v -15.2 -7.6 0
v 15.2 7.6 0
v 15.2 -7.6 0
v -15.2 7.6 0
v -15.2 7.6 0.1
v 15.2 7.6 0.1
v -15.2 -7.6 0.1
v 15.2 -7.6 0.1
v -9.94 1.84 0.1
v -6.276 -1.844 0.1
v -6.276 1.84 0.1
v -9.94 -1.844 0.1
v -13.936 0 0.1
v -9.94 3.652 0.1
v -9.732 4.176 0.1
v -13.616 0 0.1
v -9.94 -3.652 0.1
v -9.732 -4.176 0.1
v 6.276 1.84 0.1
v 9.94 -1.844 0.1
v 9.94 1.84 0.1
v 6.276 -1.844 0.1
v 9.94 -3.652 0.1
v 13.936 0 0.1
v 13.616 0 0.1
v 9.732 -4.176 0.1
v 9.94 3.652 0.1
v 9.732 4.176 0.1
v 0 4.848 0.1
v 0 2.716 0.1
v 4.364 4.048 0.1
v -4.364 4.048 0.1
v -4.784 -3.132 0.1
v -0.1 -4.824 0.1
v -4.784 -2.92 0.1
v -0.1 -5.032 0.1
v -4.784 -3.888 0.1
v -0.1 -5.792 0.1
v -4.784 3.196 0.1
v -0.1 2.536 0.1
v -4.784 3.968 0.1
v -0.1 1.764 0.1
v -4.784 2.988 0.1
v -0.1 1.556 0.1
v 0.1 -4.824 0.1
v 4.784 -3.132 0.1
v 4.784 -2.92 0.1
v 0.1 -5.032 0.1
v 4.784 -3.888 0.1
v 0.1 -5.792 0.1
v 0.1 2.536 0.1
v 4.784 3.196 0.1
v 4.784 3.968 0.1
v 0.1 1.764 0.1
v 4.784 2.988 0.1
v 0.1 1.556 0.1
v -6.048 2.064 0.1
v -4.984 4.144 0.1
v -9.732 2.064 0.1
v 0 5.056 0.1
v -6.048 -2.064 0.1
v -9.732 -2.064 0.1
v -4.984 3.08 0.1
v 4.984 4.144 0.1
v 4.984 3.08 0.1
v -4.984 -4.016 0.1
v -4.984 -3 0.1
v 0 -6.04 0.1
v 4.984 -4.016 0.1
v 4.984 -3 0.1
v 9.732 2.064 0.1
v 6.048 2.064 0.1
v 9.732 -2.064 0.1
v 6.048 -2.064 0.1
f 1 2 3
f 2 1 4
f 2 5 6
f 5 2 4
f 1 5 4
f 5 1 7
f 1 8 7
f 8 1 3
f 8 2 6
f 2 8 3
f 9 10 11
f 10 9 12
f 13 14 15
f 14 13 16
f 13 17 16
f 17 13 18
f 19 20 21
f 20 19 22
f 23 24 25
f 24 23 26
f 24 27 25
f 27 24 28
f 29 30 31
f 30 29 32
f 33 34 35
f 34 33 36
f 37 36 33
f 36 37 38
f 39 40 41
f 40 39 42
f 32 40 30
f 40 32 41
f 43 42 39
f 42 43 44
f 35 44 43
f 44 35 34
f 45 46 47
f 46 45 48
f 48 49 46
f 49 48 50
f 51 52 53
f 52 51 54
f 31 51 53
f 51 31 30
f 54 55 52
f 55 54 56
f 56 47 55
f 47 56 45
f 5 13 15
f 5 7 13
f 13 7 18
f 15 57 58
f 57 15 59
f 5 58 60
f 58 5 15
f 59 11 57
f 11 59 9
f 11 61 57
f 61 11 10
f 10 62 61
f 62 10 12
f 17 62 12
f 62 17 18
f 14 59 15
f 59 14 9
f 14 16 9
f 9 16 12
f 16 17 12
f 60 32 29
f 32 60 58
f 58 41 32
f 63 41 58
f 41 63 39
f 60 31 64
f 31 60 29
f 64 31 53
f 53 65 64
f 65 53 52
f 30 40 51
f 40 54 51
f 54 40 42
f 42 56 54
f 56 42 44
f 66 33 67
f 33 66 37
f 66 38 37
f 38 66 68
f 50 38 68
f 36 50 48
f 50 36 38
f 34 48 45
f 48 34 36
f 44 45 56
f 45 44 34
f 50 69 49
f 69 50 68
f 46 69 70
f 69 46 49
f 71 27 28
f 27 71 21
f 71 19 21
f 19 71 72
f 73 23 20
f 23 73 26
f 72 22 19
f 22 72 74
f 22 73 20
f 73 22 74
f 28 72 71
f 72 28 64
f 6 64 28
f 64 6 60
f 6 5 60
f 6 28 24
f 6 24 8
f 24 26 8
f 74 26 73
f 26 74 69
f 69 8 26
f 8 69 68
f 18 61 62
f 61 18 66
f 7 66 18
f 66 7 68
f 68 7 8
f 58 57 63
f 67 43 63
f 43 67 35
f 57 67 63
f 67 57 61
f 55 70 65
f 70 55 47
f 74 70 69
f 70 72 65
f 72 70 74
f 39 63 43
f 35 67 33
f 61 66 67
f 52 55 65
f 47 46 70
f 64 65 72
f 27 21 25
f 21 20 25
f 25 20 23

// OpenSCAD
// file: ../p/box5-12.scad
use <../lib.scad>
function ldraw_lib__box5_12() = [
// 0 Box with 5 Faces without Any Edges
// 0 Name: box5-12.dat
// 0 Author: Chris Dee [cwdee]
// 0 !LDRAW_ORG Primitive UPDATE 2009-02
// 0 !LICENSE Licensed under CC BY 2.0 and CC BY 4.0 : see CAreadme.txt
// 
// 0 BFC CERTIFY CCW
  [0,"BFC","CERTIFY"],
  [0,"BFC","CCW"],
// 
// 0 !HISTORY 2009-09-03 [PTadmin] Official Update 2009-02
// 
// 
// 4 16 1 1 1 1 1 -1 -1 1 -1 -1 1 1
  [4,16,1,1,1,1,1,-1,-1,1,-1,-1,1,1],
// 4 16 -1 0 1 1 0 1 1 1 1 -1 1 1
  [4,16,-1,0,1,1,0,1,1,1,1,-1,1,1],
// 4 16 -1 0 -1 -1 0 1 -1 1 1 -1 1 -1
  [4,16,-1,0,-1,-1,0,1,-1,1,1,-1,1,-1],
// 4 16 1 0 -1 -1 0 -1 -1 1 -1 1 1 -1
  [4,16,1,0,-1,-1,0,-1,-1,1,-1,1,1,-1],
// 4 16 1 0 1 1 0 -1 1 1 -1 1 1 1
  [4,16,1,0,1,1,0,-1,1,1,-1,1,1,1],
// 0
];
makepoly(ldraw_lib__box5_12(), line=0.2);
// main file
use <../lib.scad>
use <190145a.scad>
function ldraw_lib__190595a() = [
// 0 =Sticker  1.9 x  3.8 with Yellow Box and Arrows
// 0 Name: 190595a.dat
// 0 Author: Rafael Skibicki [Rola]
// 0 !LDRAW_ORG Part Alias UPDATE 2022-06
// 0 !LICENSE Licensed under CC BY 2.0 and CC BY 4.0 : see CAreadme.txt
// 
// 0 BFC CERTIFY CCW
  [0,"BFC","CERTIFY"],
  [0,"BFC","CCW"],
// 
// 0 !KEYWORDS Set 7823
// 
// 0 !HISTORY 2012-12-28 [PTadmin] Official Update 2012-03
// 0 !HISTORY 2022-11-15 [OrionP] Updated type and header
// 0 !HISTORY 2022-12-20 [PTadmin] Official Update 2022-06
// 
// 
// 0 // Alias of 190145a
// 
// 1 16 0 0 0 1 0 0 0 1 0 0 0 1 190145a.dat
  [1,16,0,0,0,1,0,0,0,1,0,0,0,1, ldraw_lib__190145a()],
];
makepoly(ldraw_lib__190595a(), line=0.2);
